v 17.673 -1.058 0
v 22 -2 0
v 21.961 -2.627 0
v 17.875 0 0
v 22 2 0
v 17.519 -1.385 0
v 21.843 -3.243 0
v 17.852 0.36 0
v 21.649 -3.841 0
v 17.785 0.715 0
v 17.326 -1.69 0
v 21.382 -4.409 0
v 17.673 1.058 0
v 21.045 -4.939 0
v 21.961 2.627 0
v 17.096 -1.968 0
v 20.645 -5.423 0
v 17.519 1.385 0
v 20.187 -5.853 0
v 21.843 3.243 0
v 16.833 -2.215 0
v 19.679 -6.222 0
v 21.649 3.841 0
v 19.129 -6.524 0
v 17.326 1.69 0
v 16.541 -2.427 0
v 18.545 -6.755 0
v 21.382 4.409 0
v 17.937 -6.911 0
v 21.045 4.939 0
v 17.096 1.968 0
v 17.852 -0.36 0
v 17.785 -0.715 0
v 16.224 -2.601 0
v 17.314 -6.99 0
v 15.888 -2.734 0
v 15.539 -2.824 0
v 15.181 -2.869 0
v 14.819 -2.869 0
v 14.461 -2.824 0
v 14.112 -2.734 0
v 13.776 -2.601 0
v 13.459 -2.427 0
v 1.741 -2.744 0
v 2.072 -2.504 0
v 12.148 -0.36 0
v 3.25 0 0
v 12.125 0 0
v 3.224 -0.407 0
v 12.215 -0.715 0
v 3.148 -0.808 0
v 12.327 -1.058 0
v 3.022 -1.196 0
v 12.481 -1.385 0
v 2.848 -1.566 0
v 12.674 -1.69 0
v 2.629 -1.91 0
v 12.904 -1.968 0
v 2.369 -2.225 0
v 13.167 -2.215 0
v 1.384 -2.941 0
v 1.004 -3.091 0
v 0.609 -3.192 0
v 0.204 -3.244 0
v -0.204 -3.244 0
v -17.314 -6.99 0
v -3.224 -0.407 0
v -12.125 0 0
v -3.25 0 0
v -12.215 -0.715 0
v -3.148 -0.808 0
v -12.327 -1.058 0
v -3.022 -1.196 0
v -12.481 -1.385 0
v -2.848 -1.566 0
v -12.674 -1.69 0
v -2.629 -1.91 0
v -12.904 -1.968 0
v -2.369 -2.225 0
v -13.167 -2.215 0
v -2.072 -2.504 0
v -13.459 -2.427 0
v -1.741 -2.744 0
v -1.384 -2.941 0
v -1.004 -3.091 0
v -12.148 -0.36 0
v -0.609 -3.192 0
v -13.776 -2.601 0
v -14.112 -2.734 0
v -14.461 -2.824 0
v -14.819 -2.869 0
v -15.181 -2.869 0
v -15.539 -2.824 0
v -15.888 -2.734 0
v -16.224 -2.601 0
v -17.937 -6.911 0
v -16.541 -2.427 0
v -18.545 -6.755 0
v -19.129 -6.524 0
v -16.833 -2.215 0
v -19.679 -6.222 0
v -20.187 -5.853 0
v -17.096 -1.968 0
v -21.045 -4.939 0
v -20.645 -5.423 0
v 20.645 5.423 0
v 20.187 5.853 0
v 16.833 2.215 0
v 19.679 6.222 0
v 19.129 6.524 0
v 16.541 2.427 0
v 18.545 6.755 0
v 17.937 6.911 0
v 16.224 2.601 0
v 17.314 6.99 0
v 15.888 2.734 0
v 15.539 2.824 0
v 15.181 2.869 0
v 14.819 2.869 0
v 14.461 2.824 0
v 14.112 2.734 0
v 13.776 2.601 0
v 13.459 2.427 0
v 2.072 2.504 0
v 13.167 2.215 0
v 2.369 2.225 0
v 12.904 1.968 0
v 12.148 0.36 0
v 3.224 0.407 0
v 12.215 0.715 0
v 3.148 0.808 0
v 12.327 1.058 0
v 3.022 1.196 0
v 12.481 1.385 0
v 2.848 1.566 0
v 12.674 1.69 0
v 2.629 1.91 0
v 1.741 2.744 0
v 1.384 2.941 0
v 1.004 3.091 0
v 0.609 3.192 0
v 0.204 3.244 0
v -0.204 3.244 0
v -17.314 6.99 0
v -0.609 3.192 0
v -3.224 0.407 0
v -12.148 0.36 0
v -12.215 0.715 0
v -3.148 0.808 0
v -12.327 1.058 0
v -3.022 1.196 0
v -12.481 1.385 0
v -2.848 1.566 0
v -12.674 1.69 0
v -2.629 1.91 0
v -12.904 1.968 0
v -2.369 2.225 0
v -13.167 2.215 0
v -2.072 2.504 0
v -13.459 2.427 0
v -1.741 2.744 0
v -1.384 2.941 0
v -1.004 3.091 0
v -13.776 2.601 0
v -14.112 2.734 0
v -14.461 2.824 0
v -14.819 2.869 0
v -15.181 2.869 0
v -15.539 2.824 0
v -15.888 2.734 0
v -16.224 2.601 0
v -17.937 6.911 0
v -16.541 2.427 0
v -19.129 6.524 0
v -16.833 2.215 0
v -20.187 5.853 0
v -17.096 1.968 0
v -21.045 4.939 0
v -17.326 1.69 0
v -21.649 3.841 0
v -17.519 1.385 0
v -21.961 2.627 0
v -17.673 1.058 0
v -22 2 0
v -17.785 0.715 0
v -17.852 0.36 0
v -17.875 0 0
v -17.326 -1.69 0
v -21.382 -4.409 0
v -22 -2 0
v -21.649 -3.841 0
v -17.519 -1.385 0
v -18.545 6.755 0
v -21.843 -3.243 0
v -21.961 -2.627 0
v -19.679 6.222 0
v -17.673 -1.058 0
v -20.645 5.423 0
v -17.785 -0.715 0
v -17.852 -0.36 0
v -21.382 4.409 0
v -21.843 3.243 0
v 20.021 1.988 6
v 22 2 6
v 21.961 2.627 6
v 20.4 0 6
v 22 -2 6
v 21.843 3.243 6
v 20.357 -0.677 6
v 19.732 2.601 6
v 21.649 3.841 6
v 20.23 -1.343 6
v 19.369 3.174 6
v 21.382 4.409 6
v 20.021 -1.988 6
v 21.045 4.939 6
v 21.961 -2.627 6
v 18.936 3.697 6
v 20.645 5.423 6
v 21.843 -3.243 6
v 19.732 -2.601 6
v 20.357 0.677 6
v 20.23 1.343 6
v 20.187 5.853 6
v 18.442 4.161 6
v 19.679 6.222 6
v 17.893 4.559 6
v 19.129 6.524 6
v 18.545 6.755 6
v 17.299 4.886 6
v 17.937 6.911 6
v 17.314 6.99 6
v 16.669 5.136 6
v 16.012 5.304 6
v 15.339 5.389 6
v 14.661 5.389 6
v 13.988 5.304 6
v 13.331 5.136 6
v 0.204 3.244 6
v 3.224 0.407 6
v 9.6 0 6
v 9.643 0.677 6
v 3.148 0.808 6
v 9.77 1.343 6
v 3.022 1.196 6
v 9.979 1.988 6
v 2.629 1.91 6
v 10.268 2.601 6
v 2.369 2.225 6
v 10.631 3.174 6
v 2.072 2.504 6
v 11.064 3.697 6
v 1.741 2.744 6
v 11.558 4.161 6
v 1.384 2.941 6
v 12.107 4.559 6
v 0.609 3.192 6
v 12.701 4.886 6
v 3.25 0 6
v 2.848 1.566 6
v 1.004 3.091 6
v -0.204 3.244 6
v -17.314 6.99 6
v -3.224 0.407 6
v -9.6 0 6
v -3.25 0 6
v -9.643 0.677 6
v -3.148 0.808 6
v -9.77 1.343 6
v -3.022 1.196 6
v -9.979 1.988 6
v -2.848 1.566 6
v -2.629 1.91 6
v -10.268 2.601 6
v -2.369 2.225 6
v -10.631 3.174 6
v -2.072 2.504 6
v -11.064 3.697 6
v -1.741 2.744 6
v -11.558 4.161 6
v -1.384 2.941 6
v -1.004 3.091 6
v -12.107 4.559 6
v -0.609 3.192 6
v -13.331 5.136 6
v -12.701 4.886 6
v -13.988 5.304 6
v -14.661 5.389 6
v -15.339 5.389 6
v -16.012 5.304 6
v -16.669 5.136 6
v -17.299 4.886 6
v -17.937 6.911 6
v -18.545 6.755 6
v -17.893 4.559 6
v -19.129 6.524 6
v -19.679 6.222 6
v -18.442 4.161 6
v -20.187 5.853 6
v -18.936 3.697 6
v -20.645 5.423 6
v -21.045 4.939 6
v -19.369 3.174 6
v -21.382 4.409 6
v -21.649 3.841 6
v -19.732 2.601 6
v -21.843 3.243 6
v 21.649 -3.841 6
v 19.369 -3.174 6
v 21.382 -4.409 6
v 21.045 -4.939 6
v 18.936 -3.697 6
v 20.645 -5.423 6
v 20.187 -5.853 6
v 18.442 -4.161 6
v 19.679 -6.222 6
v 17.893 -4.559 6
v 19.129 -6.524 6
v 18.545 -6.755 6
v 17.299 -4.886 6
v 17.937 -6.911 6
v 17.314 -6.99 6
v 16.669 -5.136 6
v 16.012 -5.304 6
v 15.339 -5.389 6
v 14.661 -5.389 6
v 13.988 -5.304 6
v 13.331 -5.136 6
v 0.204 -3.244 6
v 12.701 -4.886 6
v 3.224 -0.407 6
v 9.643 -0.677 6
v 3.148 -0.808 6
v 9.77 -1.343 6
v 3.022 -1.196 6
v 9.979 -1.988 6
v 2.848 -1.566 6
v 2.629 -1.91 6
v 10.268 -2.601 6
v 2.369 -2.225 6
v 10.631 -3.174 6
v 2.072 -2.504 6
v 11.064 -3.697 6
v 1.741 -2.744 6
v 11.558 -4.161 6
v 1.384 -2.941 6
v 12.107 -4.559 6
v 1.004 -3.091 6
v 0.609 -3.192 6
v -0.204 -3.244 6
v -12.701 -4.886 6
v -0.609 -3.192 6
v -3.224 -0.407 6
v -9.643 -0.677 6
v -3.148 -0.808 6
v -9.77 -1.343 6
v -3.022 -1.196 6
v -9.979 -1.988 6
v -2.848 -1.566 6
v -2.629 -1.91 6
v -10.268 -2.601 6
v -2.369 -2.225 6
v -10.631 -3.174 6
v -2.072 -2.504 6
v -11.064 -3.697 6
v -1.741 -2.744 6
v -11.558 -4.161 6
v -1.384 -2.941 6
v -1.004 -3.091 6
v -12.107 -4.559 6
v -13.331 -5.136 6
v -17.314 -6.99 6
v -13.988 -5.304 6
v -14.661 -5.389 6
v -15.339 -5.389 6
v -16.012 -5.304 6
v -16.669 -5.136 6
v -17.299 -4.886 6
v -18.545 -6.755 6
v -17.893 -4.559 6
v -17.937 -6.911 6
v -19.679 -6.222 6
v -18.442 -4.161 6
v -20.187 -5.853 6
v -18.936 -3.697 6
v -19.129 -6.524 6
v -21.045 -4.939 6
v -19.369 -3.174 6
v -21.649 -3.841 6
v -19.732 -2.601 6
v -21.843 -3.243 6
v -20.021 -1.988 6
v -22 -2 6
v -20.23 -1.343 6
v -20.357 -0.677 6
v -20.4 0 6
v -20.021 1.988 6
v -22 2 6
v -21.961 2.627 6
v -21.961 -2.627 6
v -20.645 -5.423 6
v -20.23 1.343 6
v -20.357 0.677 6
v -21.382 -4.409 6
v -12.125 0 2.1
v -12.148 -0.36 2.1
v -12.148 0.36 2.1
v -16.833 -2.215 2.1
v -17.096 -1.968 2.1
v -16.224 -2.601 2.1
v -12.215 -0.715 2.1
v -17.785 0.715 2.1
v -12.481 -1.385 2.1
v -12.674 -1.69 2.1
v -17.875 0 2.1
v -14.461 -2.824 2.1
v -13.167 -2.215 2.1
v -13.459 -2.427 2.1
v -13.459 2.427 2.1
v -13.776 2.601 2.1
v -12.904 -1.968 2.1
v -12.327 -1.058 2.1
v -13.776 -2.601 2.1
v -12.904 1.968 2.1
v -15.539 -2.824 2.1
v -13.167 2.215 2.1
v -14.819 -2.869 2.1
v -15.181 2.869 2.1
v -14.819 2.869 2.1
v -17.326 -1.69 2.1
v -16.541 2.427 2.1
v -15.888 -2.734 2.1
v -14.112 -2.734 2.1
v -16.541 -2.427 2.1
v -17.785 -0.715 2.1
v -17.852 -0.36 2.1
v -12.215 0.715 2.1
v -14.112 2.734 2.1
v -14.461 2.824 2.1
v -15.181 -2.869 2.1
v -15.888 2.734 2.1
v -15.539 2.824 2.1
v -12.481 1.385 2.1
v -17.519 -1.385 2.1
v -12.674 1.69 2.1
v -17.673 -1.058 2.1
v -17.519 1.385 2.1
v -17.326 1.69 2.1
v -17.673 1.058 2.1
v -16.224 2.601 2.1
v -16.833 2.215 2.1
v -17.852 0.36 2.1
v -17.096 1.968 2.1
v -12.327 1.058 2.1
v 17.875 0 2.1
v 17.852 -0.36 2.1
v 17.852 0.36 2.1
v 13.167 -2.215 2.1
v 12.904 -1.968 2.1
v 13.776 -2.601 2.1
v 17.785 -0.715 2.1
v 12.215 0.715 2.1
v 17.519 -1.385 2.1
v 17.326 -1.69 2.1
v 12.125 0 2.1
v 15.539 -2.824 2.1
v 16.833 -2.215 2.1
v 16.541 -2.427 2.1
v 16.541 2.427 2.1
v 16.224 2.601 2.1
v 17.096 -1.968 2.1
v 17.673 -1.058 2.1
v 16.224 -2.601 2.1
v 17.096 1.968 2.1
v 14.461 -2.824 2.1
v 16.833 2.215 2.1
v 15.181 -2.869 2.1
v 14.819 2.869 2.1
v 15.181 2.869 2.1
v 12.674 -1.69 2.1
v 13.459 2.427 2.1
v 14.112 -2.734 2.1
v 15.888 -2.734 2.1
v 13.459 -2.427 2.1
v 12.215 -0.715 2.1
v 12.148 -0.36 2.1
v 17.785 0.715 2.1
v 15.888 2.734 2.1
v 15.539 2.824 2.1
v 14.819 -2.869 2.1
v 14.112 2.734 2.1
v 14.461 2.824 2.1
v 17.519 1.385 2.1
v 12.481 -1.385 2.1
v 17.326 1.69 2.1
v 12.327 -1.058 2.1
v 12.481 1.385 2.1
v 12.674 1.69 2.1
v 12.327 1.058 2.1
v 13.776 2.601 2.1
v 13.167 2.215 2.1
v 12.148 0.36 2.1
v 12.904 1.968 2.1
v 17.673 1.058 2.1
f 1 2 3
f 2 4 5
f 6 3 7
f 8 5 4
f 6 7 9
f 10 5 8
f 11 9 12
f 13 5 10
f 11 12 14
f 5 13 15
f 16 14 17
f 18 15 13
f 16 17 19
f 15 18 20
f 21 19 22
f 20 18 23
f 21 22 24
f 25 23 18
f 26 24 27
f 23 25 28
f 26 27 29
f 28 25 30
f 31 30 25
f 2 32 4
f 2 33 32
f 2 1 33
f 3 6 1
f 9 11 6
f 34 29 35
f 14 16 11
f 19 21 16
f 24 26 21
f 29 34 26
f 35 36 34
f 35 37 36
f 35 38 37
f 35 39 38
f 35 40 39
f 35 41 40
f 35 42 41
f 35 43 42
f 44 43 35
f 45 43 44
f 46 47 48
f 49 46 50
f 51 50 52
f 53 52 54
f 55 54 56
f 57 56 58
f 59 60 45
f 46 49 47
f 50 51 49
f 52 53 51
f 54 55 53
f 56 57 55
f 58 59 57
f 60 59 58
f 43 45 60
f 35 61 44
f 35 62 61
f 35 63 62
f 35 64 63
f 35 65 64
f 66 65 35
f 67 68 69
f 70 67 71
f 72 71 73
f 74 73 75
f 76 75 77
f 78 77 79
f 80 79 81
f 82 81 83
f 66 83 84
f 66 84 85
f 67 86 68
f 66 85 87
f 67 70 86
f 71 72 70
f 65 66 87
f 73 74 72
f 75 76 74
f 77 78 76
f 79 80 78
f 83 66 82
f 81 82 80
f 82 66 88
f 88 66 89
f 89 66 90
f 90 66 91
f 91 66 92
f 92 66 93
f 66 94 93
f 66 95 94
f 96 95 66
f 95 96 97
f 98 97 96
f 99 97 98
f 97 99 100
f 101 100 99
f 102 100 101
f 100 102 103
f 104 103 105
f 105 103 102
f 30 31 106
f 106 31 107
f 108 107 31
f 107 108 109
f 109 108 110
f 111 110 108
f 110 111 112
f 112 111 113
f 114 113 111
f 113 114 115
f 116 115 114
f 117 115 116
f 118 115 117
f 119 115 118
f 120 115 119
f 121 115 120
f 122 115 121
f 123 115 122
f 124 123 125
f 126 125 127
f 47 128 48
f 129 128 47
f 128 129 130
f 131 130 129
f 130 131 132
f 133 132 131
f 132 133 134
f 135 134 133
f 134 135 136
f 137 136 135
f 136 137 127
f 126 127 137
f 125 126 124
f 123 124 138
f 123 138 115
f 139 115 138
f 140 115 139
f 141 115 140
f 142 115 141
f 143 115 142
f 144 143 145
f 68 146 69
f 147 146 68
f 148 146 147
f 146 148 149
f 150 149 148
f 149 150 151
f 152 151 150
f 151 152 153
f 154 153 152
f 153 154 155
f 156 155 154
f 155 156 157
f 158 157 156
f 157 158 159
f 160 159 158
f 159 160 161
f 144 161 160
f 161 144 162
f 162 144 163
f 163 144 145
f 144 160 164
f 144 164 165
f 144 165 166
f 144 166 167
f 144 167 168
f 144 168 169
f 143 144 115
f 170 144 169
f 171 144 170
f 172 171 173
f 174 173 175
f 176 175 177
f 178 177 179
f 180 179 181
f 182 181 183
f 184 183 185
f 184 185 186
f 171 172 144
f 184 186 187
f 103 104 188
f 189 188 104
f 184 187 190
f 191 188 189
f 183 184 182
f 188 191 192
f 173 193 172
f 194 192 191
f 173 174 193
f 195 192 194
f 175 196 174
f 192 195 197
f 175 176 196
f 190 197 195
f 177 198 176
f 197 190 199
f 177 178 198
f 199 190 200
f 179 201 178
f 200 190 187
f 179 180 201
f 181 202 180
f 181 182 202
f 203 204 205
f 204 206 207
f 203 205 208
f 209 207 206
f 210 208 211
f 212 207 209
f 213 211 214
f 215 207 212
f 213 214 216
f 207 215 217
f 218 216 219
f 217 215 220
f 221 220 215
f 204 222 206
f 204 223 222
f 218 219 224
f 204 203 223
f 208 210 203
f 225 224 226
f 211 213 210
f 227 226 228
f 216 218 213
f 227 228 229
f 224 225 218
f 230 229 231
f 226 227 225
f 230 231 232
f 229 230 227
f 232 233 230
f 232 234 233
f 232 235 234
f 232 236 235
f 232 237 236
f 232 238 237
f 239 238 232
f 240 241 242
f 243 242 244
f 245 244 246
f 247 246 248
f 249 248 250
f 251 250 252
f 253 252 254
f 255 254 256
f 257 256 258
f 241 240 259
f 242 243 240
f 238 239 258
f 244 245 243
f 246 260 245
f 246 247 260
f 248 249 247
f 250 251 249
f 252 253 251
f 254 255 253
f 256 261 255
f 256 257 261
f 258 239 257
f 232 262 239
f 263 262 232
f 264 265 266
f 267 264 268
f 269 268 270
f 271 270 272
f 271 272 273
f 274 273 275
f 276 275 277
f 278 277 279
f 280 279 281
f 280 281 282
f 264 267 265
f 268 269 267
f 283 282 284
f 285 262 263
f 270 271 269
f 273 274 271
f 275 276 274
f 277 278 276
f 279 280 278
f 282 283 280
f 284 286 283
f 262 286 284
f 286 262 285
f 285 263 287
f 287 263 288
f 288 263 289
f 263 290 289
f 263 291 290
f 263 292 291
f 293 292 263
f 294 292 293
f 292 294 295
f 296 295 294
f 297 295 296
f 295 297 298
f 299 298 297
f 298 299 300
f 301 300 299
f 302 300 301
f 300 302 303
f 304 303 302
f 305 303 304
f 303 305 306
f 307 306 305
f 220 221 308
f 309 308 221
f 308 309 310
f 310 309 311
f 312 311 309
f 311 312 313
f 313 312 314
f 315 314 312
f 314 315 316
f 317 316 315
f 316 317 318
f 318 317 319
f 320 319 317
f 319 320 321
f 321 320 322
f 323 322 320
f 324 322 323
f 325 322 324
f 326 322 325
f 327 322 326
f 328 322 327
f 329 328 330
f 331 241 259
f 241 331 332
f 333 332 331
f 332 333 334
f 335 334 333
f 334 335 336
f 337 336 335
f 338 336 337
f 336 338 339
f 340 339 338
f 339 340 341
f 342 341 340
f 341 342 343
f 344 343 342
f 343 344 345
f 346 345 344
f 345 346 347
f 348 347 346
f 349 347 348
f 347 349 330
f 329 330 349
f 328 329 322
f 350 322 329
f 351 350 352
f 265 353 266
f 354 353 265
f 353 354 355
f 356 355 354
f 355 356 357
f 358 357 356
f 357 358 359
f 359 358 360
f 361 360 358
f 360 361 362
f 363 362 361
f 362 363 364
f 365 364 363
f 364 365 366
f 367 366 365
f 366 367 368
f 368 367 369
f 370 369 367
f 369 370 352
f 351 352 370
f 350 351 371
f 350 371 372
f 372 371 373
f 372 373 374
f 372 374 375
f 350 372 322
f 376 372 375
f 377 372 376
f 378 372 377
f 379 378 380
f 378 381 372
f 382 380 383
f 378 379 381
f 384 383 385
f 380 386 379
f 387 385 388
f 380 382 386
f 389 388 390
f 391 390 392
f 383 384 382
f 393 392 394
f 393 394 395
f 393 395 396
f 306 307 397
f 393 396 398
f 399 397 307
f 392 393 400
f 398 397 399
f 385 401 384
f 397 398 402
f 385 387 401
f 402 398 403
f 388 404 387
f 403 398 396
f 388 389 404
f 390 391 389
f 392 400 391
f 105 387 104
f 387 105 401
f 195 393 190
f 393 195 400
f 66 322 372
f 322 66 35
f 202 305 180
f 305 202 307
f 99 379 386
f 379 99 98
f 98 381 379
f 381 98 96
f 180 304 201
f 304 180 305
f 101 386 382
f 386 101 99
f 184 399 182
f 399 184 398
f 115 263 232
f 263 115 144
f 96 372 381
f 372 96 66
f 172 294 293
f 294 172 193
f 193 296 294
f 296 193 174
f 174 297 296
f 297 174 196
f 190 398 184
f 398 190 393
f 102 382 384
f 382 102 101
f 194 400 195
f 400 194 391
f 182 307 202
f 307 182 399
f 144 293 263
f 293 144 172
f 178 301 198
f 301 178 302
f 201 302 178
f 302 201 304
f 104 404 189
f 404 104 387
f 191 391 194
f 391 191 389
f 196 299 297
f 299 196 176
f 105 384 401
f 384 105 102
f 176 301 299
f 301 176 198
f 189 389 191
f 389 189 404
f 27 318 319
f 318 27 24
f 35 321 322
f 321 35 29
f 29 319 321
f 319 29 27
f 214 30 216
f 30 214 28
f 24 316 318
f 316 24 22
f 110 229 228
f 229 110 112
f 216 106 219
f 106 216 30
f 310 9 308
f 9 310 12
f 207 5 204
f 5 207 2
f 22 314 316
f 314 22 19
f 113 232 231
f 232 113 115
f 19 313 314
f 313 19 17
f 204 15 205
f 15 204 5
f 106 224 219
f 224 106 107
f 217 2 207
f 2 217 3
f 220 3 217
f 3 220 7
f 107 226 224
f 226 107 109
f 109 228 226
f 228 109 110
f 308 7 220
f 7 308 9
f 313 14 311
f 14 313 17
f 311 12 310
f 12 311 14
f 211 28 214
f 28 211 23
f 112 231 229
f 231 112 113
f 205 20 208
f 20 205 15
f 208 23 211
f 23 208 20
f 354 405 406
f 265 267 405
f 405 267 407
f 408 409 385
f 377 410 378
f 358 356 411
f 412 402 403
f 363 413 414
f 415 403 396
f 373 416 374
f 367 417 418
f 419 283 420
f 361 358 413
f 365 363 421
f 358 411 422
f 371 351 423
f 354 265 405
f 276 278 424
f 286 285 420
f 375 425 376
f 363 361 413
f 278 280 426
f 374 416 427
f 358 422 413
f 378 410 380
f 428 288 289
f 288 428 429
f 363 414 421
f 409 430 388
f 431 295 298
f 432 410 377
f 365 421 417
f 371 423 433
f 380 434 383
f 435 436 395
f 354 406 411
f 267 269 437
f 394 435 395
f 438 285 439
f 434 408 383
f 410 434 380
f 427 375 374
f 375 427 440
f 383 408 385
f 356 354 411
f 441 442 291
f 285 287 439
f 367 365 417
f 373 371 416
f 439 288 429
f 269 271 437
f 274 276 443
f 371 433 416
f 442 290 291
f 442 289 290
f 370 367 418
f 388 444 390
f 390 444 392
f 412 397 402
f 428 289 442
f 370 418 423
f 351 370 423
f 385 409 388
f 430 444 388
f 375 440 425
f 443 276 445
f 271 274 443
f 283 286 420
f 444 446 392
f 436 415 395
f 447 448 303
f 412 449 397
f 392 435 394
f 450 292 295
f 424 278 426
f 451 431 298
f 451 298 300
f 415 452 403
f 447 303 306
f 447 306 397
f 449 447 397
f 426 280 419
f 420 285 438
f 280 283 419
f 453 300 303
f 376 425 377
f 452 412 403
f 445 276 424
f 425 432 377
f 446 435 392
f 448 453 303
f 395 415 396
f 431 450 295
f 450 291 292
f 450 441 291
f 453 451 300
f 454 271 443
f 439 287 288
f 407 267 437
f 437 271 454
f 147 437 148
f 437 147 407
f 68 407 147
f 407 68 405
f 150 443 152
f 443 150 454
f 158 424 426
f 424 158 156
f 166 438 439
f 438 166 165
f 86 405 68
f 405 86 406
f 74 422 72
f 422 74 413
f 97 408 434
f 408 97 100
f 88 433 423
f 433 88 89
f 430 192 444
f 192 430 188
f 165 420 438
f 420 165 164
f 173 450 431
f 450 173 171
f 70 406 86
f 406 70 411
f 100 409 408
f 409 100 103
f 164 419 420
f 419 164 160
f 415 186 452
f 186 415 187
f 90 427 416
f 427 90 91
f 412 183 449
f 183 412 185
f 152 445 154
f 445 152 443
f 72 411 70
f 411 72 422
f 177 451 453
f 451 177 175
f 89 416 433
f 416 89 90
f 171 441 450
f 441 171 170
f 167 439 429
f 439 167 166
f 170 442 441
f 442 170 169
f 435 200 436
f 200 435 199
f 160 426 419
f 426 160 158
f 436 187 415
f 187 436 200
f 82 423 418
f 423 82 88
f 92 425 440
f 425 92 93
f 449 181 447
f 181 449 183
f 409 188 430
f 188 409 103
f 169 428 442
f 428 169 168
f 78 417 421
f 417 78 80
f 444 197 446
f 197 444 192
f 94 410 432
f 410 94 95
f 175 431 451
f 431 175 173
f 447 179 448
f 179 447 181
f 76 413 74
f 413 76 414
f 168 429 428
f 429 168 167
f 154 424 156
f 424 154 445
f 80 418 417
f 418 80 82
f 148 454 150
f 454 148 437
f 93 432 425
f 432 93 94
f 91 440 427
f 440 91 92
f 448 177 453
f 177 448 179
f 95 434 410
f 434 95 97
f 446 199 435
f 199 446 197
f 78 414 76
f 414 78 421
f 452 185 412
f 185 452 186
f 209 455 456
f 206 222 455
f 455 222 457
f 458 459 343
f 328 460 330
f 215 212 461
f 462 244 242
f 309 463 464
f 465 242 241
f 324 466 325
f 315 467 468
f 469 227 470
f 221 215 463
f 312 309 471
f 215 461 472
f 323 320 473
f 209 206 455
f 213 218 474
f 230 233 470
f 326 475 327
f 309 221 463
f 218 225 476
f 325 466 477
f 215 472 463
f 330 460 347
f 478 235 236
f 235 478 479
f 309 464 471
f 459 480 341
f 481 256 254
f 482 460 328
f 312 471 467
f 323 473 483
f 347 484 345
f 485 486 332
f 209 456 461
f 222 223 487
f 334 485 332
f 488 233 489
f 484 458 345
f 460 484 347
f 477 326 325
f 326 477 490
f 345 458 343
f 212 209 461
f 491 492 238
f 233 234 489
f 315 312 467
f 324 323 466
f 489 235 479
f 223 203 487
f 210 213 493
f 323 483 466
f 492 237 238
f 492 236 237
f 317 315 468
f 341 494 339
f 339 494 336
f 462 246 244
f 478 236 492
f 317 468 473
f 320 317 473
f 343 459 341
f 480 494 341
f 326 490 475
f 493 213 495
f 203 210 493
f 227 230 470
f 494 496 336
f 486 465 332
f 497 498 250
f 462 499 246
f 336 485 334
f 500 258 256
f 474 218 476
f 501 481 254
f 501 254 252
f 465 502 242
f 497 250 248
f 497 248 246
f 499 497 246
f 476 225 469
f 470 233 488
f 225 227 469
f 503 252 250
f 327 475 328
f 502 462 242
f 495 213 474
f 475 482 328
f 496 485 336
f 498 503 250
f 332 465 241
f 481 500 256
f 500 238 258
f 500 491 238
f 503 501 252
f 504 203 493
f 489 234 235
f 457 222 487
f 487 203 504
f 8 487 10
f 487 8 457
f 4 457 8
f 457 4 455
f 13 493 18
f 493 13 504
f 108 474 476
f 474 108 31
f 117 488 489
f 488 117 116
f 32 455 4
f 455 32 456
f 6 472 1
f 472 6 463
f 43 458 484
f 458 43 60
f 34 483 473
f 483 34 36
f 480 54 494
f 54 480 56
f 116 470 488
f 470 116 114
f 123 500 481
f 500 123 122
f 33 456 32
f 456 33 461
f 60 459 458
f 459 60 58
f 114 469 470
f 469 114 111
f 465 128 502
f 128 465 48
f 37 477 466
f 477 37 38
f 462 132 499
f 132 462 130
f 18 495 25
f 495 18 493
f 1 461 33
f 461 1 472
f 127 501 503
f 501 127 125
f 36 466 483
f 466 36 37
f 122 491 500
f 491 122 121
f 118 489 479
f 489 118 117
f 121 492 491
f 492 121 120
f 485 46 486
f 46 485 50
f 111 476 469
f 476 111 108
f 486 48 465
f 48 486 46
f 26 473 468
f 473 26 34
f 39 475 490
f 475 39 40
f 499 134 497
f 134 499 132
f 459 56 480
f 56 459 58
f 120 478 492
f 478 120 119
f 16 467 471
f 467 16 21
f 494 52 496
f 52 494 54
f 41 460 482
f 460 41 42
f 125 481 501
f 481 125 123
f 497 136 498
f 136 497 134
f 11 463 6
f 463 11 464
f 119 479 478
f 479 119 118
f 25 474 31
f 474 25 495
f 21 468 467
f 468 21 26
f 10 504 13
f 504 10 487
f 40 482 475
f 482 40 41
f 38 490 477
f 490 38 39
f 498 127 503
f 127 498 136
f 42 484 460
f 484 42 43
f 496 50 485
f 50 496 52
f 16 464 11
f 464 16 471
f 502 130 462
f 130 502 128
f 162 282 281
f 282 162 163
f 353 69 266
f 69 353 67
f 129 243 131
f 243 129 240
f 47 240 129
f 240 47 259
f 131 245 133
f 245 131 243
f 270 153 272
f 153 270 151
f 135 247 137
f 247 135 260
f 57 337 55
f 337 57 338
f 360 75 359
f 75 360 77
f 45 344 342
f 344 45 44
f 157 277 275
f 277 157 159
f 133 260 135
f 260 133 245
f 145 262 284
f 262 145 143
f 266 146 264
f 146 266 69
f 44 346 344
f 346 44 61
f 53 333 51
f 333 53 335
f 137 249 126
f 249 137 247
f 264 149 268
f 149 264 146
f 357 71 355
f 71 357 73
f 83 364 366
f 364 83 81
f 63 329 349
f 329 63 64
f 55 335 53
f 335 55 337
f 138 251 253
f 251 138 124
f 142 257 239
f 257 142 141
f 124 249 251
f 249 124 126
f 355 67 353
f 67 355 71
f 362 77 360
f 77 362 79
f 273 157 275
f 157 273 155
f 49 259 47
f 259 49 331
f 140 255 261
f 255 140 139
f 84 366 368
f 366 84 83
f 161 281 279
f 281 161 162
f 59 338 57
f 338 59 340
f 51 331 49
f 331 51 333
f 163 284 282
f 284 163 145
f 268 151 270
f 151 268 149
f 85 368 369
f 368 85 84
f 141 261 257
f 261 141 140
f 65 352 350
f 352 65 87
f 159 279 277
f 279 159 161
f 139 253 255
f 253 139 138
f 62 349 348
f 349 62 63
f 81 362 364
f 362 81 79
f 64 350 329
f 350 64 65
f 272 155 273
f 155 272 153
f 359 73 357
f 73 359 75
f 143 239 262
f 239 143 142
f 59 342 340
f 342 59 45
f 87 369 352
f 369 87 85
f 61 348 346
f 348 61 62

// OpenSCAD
$fn = 50;


difference() {
	union() {
		cylinder(h = 6, r = 7.0000000000);
		translate(v = [-7.5000000000, 0.0000000000, 0]) {
			hull() {
				translate(v = [-9.5000000000, 2.0000000000, 0]) {
					cylinder(h = 6, r = 5);
				}
				translate(v = [9.5000000000, 2.0000000000, 0]) {
					cylinder(h = 6, r = 5);
				}
				translate(v = [-9.5000000000, -2.0000000000, 0]) {
					cylinder(h = 6, r = 5);
				}
				translate(v = [9.5000000000, -2.0000000000, 0]) {
					cylinder(h = 6, r = 5);
				}
			}
		}
		translate(v = [-7.5000000000, 0.0000000000, 0]) {
			hull() {
				translate(v = [-9.5000000000, 2.0000000000, 0]) {
					cylinder(h = 6, r = 5);
				}
				translate(v = [9.5000000000, 2.0000000000, 0]) {
					cylinder(h = 6, r = 5);
				}
				translate(v = [-9.5000000000, -2.0000000000, 0]) {
					cylinder(h = 6, r = 5);
				}
				translate(v = [9.5000000000, -2.0000000000, 0]) {
					cylinder(h = 6, r = 5);
				}
			}
		}
		translate(v = [7.5000000000, 0.0000000000, 0]) {
			hull() {
				translate(v = [-9.5000000000, 2.0000000000, 0]) {
					cylinder(h = 6, r = 5);
				}
				translate(v = [9.5000000000, 2.0000000000, 0]) {
					cylinder(h = 6, r = 5);
				}
				translate(v = [-9.5000000000, -2.0000000000, 0]) {
					cylinder(h = 6, r = 5);
				}
				translate(v = [9.5000000000, -2.0000000000, 0]) {
					cylinder(h = 6, r = 5);
				}
			}
		}
		translate(v = [7.5000000000, 0.0000000000, 0]) {
			hull() {
				translate(v = [-9.5000000000, 2.0000000000, 0]) {
					cylinder(h = 6, r = 5);
				}
				translate(v = [9.5000000000, 2.0000000000, 0]) {
					cylinder(h = 6, r = 5);
				}
				translate(v = [-9.5000000000, -2.0000000000, 0]) {
					cylinder(h = 6, r = 5);
				}
				translate(v = [9.5000000000, -2.0000000000, 0]) {
					cylinder(h = 6, r = 5);
				}
			}
		}
	}
	union() {
		translate(v = [-15.0000000000, 0.0000000000, 6]) {
			rotate(a = [0, 0, 0]) {
				difference() {
					union() {
						#translate(v = [0, 0, -6.0000000000]) {
							cylinder(h = 6, r = 2.6000000000);
						}
						#translate(v = [0, 0, -3.9000000000]) {
							cylinder(h = 3.9000000000, r1 = 2.8750000000, r2 = 5.4000000000);
						}
						#translate(v = [0, 0, -6.0000000000]) {
							cylinder(h = 6, r = 2.8750000000);
						}
						#translate(v = [0, 0, -6.0000000000]) {
							cylinder(h = 6, r = 2.6000000000);
						}
					}
					union();
				}
			}
		}
		translate(v = [-15.0000000000, 0.0000000000, 6]) {
			rotate(a = [0, 0, 0]) {
				difference() {
					union() {
						#translate(v = [0, 0, -6.0000000000]) {
							cylinder(h = 6, r = 2.6000000000);
						}
						#translate(v = [0, 0, -3.9000000000]) {
							cylinder(h = 3.9000000000, r1 = 2.8750000000, r2 = 5.4000000000);
						}
						#translate(v = [0, 0, -6.0000000000]) {
							cylinder(h = 6, r = 2.8750000000);
						}
						#translate(v = [0, 0, -6.0000000000]) {
							cylinder(h = 6, r = 2.6000000000);
						}
					}
					union();
				}
			}
		}
		translate(v = [15.0000000000, 0.0000000000, 6]) {
			rotate(a = [0, 0, 0]) {
				difference() {
					union() {
						#translate(v = [0, 0, -6.0000000000]) {
							cylinder(h = 6, r = 2.6000000000);
						}
						#translate(v = [0, 0, -3.9000000000]) {
							cylinder(h = 3.9000000000, r1 = 2.8750000000, r2 = 5.4000000000);
						}
						#translate(v = [0, 0, -6.0000000000]) {
							cylinder(h = 6, r = 2.8750000000);
						}
						#translate(v = [0, 0, -6.0000000000]) {
							cylinder(h = 6, r = 2.6000000000);
						}
					}
					union();
				}
			}
		}
		translate(v = [15.0000000000, 0.0000000000, 6]) {
			rotate(a = [0, 0, 0]) {
				difference() {
					union() {
						#translate(v = [0, 0, -6.0000000000]) {
							cylinder(h = 6, r = 2.6000000000);
						}
						#translate(v = [0, 0, -3.9000000000]) {
							cylinder(h = 3.9000000000, r1 = 2.8750000000, r2 = 5.4000000000);
						}
						#translate(v = [0, 0, -6.0000000000]) {
							cylinder(h = 6, r = 2.8750000000);
						}
						#translate(v = [0, 0, -6.0000000000]) {
							cylinder(h = 6, r = 2.6000000000);
						}
					}
					union();
				}
			}
		}
		translate(v = [0, 0, -100]) {
			cylinder(h = 200, r = 3.2500000000);
		}
		translate(v = [0, 0, -100]) {
			cylinder(h = 200, r = 1.8000000000);
		}
	}
}
